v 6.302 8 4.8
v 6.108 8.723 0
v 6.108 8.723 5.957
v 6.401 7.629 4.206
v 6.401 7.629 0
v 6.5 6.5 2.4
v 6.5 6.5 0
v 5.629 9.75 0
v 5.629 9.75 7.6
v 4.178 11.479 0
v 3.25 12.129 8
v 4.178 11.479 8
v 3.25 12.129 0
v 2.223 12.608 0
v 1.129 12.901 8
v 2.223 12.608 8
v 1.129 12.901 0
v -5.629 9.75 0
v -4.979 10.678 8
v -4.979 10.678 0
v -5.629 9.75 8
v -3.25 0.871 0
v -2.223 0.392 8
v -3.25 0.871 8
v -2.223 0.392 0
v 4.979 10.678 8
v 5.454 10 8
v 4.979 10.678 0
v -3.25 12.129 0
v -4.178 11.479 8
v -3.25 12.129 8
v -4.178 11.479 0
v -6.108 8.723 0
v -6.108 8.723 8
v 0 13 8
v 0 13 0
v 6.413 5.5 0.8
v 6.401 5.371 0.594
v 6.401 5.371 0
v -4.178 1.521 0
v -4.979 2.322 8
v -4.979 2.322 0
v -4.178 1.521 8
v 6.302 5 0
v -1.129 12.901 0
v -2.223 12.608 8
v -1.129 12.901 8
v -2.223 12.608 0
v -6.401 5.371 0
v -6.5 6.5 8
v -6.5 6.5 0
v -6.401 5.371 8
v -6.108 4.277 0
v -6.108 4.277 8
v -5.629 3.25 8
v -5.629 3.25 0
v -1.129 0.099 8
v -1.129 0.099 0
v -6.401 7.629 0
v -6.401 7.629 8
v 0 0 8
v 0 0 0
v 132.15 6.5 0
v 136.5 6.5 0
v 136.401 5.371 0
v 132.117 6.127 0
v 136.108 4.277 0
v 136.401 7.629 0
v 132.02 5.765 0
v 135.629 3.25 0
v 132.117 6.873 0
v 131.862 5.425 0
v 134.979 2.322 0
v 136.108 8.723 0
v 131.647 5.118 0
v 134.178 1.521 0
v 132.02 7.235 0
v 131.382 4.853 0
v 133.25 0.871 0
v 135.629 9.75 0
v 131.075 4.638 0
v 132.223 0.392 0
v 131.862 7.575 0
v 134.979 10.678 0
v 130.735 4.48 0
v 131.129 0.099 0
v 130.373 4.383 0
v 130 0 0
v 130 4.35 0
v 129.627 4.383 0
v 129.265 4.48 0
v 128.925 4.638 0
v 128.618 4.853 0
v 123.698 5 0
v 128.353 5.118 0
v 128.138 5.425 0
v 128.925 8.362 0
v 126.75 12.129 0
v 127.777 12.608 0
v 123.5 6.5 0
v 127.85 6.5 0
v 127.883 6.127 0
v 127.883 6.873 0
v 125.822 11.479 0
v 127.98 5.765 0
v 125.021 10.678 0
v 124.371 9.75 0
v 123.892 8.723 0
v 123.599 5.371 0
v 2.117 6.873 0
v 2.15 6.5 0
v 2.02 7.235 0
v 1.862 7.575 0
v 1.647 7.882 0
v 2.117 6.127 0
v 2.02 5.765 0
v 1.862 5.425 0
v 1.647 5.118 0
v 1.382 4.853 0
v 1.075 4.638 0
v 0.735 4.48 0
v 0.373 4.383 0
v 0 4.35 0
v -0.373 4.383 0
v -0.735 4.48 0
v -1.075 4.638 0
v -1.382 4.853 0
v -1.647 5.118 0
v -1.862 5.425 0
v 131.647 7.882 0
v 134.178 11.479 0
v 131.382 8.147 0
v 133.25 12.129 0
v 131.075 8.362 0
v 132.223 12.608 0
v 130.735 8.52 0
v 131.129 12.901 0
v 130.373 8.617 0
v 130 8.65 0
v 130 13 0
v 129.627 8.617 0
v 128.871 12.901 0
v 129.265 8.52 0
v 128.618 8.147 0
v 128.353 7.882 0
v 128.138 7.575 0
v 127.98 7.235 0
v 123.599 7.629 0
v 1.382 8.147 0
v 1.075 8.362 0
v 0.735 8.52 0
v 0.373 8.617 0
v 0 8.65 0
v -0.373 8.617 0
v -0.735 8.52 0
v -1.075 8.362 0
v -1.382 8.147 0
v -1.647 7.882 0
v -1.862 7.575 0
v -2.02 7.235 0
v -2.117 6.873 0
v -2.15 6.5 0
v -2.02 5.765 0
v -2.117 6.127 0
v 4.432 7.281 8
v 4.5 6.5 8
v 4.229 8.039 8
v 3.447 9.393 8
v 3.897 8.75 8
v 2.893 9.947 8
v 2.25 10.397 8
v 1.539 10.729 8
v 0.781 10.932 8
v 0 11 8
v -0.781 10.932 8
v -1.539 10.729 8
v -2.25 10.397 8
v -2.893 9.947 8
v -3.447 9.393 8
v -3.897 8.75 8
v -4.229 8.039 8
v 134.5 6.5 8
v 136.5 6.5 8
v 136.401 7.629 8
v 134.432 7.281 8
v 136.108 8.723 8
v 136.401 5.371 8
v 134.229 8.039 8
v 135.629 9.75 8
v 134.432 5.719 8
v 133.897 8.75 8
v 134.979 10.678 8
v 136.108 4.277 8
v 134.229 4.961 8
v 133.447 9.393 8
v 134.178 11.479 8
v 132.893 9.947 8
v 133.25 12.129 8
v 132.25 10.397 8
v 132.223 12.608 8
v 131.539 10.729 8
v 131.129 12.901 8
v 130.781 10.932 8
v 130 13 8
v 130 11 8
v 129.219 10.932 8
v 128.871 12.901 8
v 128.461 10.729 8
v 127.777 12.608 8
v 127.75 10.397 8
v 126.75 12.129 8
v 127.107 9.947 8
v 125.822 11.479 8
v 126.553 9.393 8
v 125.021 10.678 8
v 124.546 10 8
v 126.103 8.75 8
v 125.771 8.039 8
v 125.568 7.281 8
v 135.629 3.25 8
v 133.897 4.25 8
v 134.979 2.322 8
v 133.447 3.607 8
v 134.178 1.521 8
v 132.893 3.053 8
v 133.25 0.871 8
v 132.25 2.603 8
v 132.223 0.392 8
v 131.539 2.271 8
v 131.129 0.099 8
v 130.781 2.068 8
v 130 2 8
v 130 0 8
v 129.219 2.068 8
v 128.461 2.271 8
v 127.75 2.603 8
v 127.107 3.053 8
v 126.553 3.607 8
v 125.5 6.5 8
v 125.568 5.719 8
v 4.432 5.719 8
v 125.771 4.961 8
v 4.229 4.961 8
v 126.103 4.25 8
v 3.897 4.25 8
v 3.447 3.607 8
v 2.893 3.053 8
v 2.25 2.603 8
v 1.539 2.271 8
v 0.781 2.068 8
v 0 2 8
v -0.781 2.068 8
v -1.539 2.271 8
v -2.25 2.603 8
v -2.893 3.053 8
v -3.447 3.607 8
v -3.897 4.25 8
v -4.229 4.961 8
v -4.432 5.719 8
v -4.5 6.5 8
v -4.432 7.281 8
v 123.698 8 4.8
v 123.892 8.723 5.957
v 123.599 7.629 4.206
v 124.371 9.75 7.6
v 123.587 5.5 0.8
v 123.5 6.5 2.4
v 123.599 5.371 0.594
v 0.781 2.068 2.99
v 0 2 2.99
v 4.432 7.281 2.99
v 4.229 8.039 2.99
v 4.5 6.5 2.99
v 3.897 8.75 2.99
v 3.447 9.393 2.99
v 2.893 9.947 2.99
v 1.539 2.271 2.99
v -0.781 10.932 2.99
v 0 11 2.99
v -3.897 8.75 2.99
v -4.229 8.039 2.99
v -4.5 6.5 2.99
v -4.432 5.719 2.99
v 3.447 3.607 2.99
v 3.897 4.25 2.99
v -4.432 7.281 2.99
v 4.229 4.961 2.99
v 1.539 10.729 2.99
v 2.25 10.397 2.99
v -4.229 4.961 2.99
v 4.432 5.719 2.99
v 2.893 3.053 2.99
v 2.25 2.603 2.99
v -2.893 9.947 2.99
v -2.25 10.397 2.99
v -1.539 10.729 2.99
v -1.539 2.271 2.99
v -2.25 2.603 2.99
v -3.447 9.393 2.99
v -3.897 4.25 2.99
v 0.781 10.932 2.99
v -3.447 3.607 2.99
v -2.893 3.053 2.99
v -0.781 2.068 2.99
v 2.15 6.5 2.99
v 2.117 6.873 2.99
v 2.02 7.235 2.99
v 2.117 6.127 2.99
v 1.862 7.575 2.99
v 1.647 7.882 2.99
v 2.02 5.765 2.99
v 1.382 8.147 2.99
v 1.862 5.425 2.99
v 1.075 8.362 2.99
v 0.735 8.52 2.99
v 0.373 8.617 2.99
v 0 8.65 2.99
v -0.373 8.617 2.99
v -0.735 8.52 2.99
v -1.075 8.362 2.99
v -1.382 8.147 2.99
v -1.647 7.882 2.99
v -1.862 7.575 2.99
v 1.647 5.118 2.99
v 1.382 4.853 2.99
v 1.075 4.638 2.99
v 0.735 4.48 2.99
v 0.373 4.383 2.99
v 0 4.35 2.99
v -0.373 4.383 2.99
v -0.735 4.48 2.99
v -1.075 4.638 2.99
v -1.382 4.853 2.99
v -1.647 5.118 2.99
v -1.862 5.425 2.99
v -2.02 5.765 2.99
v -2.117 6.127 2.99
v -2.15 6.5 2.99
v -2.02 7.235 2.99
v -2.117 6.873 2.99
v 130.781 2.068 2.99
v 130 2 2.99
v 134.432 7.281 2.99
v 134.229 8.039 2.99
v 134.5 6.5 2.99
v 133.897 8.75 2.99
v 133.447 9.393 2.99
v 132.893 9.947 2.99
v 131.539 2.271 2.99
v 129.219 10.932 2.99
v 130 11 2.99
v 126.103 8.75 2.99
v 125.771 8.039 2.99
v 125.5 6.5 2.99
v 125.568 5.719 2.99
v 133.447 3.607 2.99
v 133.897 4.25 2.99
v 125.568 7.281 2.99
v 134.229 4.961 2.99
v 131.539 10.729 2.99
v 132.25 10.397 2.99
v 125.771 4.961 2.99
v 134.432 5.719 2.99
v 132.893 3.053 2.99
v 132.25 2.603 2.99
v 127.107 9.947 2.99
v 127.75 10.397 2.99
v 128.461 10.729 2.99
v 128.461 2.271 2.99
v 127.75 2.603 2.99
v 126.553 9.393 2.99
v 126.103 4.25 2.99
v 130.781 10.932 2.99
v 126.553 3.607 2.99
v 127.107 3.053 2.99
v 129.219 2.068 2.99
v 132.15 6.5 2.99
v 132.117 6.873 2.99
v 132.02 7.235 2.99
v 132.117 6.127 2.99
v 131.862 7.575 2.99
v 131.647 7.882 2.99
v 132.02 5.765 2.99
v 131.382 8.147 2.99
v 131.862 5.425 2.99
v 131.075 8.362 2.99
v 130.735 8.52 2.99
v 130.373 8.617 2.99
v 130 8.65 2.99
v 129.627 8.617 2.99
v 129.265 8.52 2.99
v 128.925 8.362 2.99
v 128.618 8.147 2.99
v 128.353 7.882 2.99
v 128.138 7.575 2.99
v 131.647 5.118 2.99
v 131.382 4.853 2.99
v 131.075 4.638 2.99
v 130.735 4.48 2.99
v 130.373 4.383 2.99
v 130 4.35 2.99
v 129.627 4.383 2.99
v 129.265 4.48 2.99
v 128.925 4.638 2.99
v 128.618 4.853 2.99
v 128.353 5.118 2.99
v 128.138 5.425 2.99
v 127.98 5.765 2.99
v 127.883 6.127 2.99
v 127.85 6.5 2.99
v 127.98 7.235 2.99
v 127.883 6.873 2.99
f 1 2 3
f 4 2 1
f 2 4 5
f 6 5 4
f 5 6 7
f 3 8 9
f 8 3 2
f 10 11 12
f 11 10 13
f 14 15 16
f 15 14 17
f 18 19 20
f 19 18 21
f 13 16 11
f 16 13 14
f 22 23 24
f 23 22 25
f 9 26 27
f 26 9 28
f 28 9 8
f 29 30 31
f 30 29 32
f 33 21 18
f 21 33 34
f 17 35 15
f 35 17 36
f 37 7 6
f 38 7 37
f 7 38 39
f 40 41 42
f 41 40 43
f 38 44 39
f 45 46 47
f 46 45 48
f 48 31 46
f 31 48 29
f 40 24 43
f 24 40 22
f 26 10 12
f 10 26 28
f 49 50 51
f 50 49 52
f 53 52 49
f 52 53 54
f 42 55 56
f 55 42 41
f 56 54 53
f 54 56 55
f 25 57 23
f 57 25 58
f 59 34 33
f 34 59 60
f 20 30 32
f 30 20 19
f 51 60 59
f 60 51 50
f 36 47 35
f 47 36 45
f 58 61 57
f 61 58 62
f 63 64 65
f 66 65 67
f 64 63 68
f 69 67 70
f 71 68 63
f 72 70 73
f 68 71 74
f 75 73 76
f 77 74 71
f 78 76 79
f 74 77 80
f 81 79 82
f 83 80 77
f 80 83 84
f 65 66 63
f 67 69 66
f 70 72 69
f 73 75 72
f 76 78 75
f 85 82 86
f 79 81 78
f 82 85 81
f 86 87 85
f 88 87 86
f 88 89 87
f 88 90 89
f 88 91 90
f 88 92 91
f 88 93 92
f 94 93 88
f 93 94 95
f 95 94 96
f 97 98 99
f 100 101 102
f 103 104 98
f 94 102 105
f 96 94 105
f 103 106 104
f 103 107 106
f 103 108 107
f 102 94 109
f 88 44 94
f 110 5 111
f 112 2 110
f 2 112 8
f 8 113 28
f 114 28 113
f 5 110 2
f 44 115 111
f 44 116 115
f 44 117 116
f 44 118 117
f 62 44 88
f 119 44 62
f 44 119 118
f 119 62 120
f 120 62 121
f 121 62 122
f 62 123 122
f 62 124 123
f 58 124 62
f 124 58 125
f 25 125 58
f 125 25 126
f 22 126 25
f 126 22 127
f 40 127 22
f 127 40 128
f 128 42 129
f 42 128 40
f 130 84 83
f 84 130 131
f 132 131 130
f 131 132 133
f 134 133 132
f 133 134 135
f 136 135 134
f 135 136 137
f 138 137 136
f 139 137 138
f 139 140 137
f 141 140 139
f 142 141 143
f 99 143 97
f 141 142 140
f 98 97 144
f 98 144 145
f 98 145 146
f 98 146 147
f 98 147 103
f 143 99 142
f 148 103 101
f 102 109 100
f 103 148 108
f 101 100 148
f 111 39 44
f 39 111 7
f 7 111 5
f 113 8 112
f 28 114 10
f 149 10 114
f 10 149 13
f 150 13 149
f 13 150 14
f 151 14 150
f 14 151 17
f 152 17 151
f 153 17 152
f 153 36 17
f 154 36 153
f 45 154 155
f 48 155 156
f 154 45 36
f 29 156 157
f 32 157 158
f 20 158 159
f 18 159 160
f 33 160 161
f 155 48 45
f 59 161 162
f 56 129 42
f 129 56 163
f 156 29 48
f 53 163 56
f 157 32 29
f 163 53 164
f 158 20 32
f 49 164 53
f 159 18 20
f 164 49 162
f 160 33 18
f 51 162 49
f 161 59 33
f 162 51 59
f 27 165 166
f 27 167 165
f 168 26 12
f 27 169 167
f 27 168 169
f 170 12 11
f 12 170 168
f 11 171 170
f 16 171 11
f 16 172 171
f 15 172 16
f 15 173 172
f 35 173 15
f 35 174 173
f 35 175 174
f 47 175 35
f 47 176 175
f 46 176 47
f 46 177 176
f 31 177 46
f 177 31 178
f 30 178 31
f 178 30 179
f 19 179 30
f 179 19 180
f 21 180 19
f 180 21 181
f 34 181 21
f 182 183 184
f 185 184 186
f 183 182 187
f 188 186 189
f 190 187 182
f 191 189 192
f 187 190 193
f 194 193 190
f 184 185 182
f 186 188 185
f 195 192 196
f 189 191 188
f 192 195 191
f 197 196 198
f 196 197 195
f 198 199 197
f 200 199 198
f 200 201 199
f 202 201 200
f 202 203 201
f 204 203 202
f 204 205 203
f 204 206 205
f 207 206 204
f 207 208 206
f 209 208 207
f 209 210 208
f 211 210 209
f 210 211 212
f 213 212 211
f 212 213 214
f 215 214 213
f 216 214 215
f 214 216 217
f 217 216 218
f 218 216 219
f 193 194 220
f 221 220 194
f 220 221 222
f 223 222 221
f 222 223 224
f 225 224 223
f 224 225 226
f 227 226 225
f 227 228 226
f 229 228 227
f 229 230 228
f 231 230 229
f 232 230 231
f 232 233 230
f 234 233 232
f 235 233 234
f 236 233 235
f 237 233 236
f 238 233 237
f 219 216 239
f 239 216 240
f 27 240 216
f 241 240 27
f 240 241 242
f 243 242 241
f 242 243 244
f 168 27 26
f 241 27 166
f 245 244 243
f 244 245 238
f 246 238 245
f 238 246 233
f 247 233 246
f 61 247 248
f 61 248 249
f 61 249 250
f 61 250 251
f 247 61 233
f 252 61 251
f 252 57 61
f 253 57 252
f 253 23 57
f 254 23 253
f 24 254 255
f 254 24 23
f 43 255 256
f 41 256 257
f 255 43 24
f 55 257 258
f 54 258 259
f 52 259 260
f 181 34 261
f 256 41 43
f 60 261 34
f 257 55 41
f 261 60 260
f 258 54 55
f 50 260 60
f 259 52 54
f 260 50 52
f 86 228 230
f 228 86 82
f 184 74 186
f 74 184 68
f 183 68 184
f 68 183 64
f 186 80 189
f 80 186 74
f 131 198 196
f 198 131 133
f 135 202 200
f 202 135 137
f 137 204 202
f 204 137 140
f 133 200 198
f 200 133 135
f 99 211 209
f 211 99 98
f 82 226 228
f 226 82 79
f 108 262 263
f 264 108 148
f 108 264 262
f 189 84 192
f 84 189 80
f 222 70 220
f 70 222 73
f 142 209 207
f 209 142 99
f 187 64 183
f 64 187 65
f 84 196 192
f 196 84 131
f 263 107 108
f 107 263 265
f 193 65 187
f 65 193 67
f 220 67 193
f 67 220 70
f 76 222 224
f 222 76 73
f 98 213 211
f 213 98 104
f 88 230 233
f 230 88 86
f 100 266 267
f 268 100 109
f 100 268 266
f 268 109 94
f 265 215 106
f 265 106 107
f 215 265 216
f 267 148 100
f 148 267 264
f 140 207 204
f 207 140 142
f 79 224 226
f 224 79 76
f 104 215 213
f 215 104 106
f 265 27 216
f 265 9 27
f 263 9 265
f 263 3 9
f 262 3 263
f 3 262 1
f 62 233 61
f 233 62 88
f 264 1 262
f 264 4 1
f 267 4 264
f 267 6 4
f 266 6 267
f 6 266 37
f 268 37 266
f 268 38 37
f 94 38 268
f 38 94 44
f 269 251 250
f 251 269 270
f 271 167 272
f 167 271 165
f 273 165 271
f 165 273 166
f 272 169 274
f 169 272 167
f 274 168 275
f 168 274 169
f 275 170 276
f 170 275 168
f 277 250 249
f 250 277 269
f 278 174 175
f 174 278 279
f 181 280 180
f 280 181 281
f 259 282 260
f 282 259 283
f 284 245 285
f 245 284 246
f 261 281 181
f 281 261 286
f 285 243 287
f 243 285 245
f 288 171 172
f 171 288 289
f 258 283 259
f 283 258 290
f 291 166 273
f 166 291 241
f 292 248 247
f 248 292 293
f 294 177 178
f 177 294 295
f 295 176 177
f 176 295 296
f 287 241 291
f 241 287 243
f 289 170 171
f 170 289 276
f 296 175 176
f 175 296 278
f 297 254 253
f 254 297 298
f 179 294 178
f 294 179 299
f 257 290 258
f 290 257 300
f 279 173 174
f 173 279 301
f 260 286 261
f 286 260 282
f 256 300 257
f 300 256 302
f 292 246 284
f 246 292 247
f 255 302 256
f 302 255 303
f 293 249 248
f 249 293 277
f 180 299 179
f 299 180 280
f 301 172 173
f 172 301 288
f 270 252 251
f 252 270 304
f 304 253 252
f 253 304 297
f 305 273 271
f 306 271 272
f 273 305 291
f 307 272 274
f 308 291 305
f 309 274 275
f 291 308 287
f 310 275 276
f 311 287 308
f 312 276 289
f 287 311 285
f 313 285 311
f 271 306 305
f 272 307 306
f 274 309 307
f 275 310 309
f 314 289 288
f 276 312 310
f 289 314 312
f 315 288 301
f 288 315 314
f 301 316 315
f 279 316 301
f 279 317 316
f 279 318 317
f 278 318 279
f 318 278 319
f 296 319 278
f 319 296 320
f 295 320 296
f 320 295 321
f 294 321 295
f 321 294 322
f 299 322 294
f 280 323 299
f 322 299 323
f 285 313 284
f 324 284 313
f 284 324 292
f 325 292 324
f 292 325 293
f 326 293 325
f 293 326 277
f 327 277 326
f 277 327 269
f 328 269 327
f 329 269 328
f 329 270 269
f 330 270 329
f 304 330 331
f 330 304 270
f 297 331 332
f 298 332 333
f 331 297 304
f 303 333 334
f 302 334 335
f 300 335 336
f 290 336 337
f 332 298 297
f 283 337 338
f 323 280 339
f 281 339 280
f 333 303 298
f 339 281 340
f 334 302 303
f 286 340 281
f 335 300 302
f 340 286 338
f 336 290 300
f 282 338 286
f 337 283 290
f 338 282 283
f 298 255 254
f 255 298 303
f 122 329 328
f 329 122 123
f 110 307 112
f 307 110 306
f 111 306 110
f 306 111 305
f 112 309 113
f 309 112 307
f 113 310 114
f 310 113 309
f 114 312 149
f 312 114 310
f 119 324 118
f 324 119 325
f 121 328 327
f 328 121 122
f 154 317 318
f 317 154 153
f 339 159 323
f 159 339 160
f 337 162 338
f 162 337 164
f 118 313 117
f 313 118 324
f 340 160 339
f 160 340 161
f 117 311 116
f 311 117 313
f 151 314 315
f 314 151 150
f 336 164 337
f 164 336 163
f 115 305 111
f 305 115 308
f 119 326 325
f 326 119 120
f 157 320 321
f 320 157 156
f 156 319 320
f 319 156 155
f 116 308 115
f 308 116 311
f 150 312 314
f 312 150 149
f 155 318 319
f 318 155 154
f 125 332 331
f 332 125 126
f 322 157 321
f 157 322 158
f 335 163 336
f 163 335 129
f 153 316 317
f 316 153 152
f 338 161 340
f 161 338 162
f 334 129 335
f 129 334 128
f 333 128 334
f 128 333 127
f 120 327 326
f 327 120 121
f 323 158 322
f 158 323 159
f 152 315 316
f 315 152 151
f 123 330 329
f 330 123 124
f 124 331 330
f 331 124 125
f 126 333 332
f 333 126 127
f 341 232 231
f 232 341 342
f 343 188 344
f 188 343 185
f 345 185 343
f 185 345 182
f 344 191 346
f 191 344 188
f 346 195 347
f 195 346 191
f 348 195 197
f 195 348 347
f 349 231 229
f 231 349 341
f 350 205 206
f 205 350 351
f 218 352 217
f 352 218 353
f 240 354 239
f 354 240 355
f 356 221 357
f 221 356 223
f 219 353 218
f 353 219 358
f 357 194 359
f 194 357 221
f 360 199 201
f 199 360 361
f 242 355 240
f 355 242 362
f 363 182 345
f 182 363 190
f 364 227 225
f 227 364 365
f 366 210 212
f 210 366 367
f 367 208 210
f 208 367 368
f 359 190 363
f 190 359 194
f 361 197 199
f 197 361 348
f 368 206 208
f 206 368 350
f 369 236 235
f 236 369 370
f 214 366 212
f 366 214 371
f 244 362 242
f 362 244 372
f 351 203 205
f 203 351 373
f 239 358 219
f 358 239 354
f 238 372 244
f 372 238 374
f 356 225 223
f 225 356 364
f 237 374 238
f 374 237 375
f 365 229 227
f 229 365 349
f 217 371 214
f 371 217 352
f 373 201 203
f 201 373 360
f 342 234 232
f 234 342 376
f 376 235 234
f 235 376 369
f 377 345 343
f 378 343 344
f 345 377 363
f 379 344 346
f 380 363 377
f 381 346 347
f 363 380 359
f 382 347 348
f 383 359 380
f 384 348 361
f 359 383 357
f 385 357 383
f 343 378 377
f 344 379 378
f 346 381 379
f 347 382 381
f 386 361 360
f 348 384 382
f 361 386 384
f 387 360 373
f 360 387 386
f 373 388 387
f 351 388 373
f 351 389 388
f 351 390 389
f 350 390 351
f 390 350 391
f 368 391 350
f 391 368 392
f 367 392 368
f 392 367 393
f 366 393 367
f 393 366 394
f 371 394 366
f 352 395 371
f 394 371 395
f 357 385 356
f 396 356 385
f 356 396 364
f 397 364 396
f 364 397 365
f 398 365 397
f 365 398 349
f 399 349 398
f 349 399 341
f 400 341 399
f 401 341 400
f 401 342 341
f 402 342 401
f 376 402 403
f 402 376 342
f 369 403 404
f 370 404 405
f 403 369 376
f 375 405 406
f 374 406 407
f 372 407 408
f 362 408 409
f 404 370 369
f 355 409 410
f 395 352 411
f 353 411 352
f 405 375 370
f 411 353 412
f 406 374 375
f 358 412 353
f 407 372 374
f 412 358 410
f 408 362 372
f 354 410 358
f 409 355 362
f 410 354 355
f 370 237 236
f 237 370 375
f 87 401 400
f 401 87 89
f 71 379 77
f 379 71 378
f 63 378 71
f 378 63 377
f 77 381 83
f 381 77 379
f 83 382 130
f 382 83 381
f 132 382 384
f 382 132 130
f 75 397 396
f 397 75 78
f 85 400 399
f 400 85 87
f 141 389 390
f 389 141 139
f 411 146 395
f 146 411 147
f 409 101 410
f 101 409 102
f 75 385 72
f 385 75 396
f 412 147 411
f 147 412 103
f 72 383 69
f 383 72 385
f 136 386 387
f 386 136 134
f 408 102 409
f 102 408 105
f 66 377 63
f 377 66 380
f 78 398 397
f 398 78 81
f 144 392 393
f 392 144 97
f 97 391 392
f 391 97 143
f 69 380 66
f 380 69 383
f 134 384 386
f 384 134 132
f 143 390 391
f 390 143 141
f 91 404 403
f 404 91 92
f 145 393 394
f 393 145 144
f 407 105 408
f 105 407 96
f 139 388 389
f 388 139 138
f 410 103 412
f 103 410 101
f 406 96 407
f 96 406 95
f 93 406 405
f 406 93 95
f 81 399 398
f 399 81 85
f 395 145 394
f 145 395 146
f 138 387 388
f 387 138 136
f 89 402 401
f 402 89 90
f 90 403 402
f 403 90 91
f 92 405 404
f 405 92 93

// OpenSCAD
//use <tubemesh.scad>;
// params = [sections,sectionCounts]

// written for tail-recursion
// _subtotals[i] = list[0] + ... + list[i-1]
function _subtotals(list,soFar=[]) =
        len(soFar) >= 1+len(list) ? soFar :
        _subtotals(list,
            let(n1=len(soFar))
            concat(soFar, n1>0 ? soFar[n1-1]+list[n1-1] : 0));

function _flatten(list) = [for (a=list) for(b=a) b];

function _reverseTriangle(t) = [t[2], t[1], t[0]];

// smallest angle in triangle
function _minAngle(p1,p2,p3) =
    let(a = p2-p1,
        b = p3-p1,
        c = p3-p2,
        v1 = a*b,
        v2 = -(c*a))
        v1 == 0 || v2 == 0 ? 0 :
        let( na = norm(a),
             a1 = acos(v1 / (na*norm(b))),
             a2 = acos(v2 / (na*norm(c))) )
        min(a1,a2,180-(a1+a2));

// triangulate square to maximize smallest angle
function _doSquare(points,i11,i21,i22,i12,optimize=true) =
    points[i11]==points[i12] ? [[i11,i21,i22]] :
    points[i21]==points[i22] ? [[i22,i12,i11]] :
    !optimize ? [[i11,i21,i22], [i22,i12,i11]] :
    let (m1 = min(_minAngle(points[i11],points[i21],points[i22]), _minAngle(points[i22],points[i12],points[i11])),
        m2 = min(_minAngle(points[i11],points[i21],points[i12]),
                _minAngle(points[i21],points[i22],points[i12])) )
        m2 <= m1 ? [[i11,i21,i22], [i22,i12,i11]] :
                  [[i11,i21,i12], [i21,i22,i12]];

/*
function _inTriangle(v1,t) = (v1==t[0] || v1==t[1] || v1==t[2]);

function _findTheDistinctVertex(t1,t2) =
    let(in = [for(i=[0:2]) _inTriangle(t1[i],t2)])
    ! in[0] && in[1] && in[2] ? 0 :
    ! in[1] && in[0] && in[2] ? 1 :
    ! in[2] && in[0] && in[1] ? 2 :
    undef;

// make vertex i come first
function _rotateTriangle(t,i) =
    [for (j=[0:2]) t[(j+i)%3]];

function _optimize2Triangles(points,t1,t2) =
    let(i1 = _findTheDistinctVertex(t1,t2))
    i1 == undef ? [t1,t2] :
    let(i2 = _findTheDistinctVertex(t2,t1))
    i2 == undef ? [t1,t2] :
    let(t1 = _rotateTriangle(t1,i1),
        t2 = _rotateTriangle(t2,i2))
    _doSquare(points,t1[1],t2[0],t2[1],t1[0],optimize=true);

// a greedy optimization for a strip of triangles most of which adjoin one another; written for tail-recursion
function _optimizeTriangles(points,triangles,position=0,optimize=true,iterations=4) =
        !optimize || position >= iterations*len(triangles) ? triangles :
            _optimizeTriangles(points,
                let(
                    n = len(triangles),
                    position1=position%n,
                    position2=(position+1)%n,
                    opt=_optimize2Triangles(points,triangles[position1],triangles[position2]))
                    [for (i=[0:len(triangles)-1])
                        i == position1 ? opt[0] :
                        i == position2 ? opt[1] :
                            triangles[i]],
                position=position+1);
*/

function _removeEmptyTriangles(points,triangles) =
    [for(t=triangles)
        if(true || points[t[0]] != points[t[1]] && points[t[1]] != points[t[2]] && points[t[2]] != points[t[0]]) t];

// n1 and n2 should be fairly small, so this doesn't need
// tail-recursion
// this assumes n1<=n2
function _tubeSegmentTriangles(points,index1,n1,index2,n2,i=0,soFar=[],optimize=true)
    = i>=n2 ? _removeEmptyTriangles(points,soFar) :
            let(i21=i,
                i22=(i+1)%n2,
                i11=floor((i21)*n1/n2+0.5)%n1,
                i12=floor((i22)*n1/n2+0.5)%n1,
                add = i11==i12 ? [[index1+i11,index2+i21,index2+i22]] :
                    _doSquare(points,index1+i11,index2+i21,index2+i22,index1+i12,optimize=optimize))
                _tubeSegmentTriangles(points,index1,n1,index2,n2,i=i+1,soFar=concat(soFar,add),optimize=optimize);

function _tubeSegmentFaces(points,index,n1,n2,optimize=true)
    = n1<n2 ? _tubeSegmentTriangles(points,index,n1,index+n1,n2,optimize=optimize) :
        [for (f=_tubeSegmentTriangles(points,index+n1,n2,index,n1,optimize=optimize)) _reverseTriangle(f)];

function _tubeMiddleFaces(points,counts,subtotals,optimize=true) = [ for (i=[1:len(counts)-1])
           for (face=_tubeSegmentFaces(points,subtotals[i-1],counts[i-1],counts[i],optimize=optimize)) face ];

function _endCaps(counts,subtotals,startCap=true,endCap=true) =
    let( n = len(counts),
         cap1 = counts[0]<=2 || !startCap ? undef : [for(i=[0:counts[0]-1]) i],
         cap2 = counts[n-1]<=2 || !endCap ? undef : [for(i=[counts[n-1]-1:-1:0]) subtotals[n-1]+i] )
       [for (c=[cap1,cap2]) if (c!=undef) c];

function _tubeFaces(sections,startCap=true,endCap=true,optimize=true) =
                let(
        counts = [for (s=sections) len(s)],
        points = _flatten(sections),
        subtotals = _subtotals(counts))
            concat(_tubeMiddleFaces(points,counts,subtotals,optimize=optimize),_endCaps(counts,subtotals,startCap=true,endCap=true));

function _removeDuplicates1(points,soFar=[[],[]]) =
        len(soFar[0]) >= len(points) ? soFar :
            _removeDuplicates1(points,
               let(
                mapSoFar=soFar[0],
                pointsSoFar=soFar[1],
                j=len(mapSoFar),
                k=search([points[j]], pointsSoFar)[0])
                k == []? [concat(mapSoFar,[len(pointsSoFar)]),
                            concat(pointsSoFar,[points[j]])] :
                           [concat(mapSoFar,[k]),pointsSoFar]);

function _removeDuplicates(points, faces) =
    let(fix=_removeDuplicates1(points),
        map=fix[0],
        newPoints=fix[1],
        newFaces=[for(f=faces) [for(v=f) map[v]]])
            [newPoints, newFaces];

function pointsAndFaces(sections,startCap=true,endCap=true,optimize=true) =
        let(
            points0=_flatten(sections),
            faces0=_tubeFaces(sections,startCap=startCap,endCap=endCap,optimize=optimize))
        _removeDuplicates(points0,faces0);

function sectionZ(section,z) = [for(xy=section) [xy[0],xy[1],z]];

function shiftSection(section,delta) = [for(p=section) [for(i=[0:len(delta)-1]) (p[i]==undef?0:p[i])+delta[i]]];

module tubeMesh(sections,startCap=true,endCap=true,optimize=true) {
    pAndF = pointsAndFaces(sections,startCap=startCap,endCap=endCap,optimize=optimize);
    polyhedron(points=pAndF[0],faces=pAndF[1]);
}

// increase number of points from len(section) to n
function _interpolateSection(section,n) =
        let(m=len(section))
        n == m ? section :
        n < m ? undef :
            [for(i=[0:m-1])
                let(cur=floor(i*n/m),
                    k=floor((i+1)*n/m)-cur,
                    i2=(i+1)%m)
                    for(j=[0:k-1])
                        let(t=j/k)
                            section[i]*(1-t)+section[i2]*t];

function arcPoints(r=10,d=undef,start=0,end=180,z=undef) =
            let(r=d==undef?r:d/2,
                n=getPointsAround(abs(end-start)))
                    r*[for(i=[0:n])
                        let(angle=start+i*(end-start)/n) [cos(angle),sin(angle)]];

function ngonPoints(n=4,r=10,d=undef,rotate=0,z=undef) =
            let(r=d==undef?r:d/2)
            z==undef ?
            r*[for(i=[0:n-1]) let(angle=i*360/n+rotate) [cos(angle),sin(angle)]] :
            [for(i=[0:n-1]) let(angle=i*360/n+rotate) [r*cos(angle),r*sin(angle),z]];

function starPoints(n=10,r1=5,r2=10,rotate=0,z=undef) =
          z==undef ?
            [for(i=[0:2*n-1]) let(angle=i*180/n+rotate) (i%2?r1:r2) * [cos(angle),sin(angle)]] :
            [for(i=[0:2*n-1]) let(angle=i*180/n+rotate, r=i%2?r1:r2) [r*cos(angle),r*sin(angle),z]];

function roundedSquarePoints(size=[10,10],radius=2,z=undef) =
    let(n=$fn?$fn:32,
        x=len(size)>=2 ? size[0] : size,
        y=len(size)>=2 ? size[1] : size,
        centers=[[x-radius,y-radius],[radius,y-radius],[radius,radius],[x-radius,radius]],
        section=[for(i=[0:n-1])
            let(center=centers[floor(i*4/n)],
                angle=360*i/n)
            center+radius*[cos(angle),sin(angle)]])
        z==undef ? section : sectionZ(section,z);

function getPointsAround(radius, angle=360) =
    max(3, $fn ? ceil($fn*angle/360) :
        max(floor(0.5+angle/$fa), floor(0.5+2*radius*PI*angle/360/$fs)));

// warning: no guarantee of perfect convexity
module mySphere(r=10,d=undef) {
    GA = 2.39996322972865332 * 180 / PI;
    radius = d==undef ? r : d/2;
    pointsAround = getPointsAround(radius);
    numSlices0 = (pointsAround + pointsAround % 2)/2;
    numSlices = numSlices0 + (numSlices0%2);
    sections = radius*[for(i=[0:numSlices])
                    i == 0 ? [[0,0,-1]] :
                    i == numSlices ? [[0,0,1]] :
                    let(
                        lat = (i-numSlices/2)/(numSlices/2)*90,
                        z1 = sin(lat),
                        r1 = cos(lat),
                        count = max(3,floor(0.5 + pointsAround * abs(r1))))
                        ngonPoints(count,r=r1,z=z1)];
    data = pointsAndFaces(sections,optimize=false);
    polyhedron(points=data[0], faces=data[1]);
}

module morphExtrude(section1,section2,height=undef,twist=0,numSlices=10,startCap=true,endCap=true,optimize=false) {
    n = max(len(section1),len(section2));

    section1interp = _interpolateSection(section1,n);
    section2interp = _interpolateSection(section2,n);
    sections = height == undef ?
                      [for(i=[0:numSlices])
                        let(t=i/numSlices)
                        (1-t)*section1interp+t*section2interp] :
                      [for(i=[0:numSlices])
                        let(t=i/numSlices,
                            theta = t*twist,
                            section=(1-t)*section1interp+t*section2interp)
                        [for(p=section) [p[0]*cos(theta)-p[1]*sin(theta),p[0]*sin(theta)+p[1]*cos(theta),height*t]]];

    tubeMesh(sections,startCap=startCap,endCap=endCap,optimize=false);
}

module cone(r=10,d=undef,height=10) {
    radius = d==undef ? r : d/2;
    pointsAround =
        $fn ? $fn :
        max(3, floor(0.5+360/$fa), floor(0.5+2*radius*PI/$fs));
    morphExtrude(ngonPoints(n=pointsAround,r=radius), [[0,0]], height=height,optimize=false);
}

module prism(base=[[0,0,0],[1,0,0],[0,1,0]], vertical=[0,0,1]) {
    morphExtrude(base,[for(v=base) v+vertical],numSlices=1);
}


length = 130;
thickness = 8;
minWidth = 5;
maxWidth = 10;
plasticThicknessBelowScrew = 3;
sizeAroundCountersink = 2;
countersinkDiameter = 9;
countersinkDepth = 3;
screwHoleDiameter = 4.3;

module dummy() {}

nudge = 0.01;

module pull() {
    section0 = [ [0,0], [length,0], [length,minWidth], [0, minWidth] ];
    section1 = [ [0,0], [length,0], [length,maxWidth], [0, maxWidth] ];
    morphExtrude(section0,section1,thickness);
}

$fn = 36;
h1 = max(plasticThicknessBelowScrew+countersinkDepth,thickness);
module screwHole() {
    translate([0,0,-nudge]) {
        translate([0,0,plasticThicknessBelowScrew])
        cylinder(d=countersinkDiameter,h=countersinkDepth+2*nudge+thickness);
        cylinder(d=screwHoleDiameter,h=h1+nudge);
    }
}

render(convexity=2)
difference() {
    d1 = 2*sizeAroundCountersink+countersinkDiameter;
    union() {
        pull();
        for (i=[0:1])
            translate([i*length,d1/2,0])
        cylinder(d=d1,h1);
    }
    for (i=[0:1])
        translate([i*length,d1/2,0]) screwHole();

}
